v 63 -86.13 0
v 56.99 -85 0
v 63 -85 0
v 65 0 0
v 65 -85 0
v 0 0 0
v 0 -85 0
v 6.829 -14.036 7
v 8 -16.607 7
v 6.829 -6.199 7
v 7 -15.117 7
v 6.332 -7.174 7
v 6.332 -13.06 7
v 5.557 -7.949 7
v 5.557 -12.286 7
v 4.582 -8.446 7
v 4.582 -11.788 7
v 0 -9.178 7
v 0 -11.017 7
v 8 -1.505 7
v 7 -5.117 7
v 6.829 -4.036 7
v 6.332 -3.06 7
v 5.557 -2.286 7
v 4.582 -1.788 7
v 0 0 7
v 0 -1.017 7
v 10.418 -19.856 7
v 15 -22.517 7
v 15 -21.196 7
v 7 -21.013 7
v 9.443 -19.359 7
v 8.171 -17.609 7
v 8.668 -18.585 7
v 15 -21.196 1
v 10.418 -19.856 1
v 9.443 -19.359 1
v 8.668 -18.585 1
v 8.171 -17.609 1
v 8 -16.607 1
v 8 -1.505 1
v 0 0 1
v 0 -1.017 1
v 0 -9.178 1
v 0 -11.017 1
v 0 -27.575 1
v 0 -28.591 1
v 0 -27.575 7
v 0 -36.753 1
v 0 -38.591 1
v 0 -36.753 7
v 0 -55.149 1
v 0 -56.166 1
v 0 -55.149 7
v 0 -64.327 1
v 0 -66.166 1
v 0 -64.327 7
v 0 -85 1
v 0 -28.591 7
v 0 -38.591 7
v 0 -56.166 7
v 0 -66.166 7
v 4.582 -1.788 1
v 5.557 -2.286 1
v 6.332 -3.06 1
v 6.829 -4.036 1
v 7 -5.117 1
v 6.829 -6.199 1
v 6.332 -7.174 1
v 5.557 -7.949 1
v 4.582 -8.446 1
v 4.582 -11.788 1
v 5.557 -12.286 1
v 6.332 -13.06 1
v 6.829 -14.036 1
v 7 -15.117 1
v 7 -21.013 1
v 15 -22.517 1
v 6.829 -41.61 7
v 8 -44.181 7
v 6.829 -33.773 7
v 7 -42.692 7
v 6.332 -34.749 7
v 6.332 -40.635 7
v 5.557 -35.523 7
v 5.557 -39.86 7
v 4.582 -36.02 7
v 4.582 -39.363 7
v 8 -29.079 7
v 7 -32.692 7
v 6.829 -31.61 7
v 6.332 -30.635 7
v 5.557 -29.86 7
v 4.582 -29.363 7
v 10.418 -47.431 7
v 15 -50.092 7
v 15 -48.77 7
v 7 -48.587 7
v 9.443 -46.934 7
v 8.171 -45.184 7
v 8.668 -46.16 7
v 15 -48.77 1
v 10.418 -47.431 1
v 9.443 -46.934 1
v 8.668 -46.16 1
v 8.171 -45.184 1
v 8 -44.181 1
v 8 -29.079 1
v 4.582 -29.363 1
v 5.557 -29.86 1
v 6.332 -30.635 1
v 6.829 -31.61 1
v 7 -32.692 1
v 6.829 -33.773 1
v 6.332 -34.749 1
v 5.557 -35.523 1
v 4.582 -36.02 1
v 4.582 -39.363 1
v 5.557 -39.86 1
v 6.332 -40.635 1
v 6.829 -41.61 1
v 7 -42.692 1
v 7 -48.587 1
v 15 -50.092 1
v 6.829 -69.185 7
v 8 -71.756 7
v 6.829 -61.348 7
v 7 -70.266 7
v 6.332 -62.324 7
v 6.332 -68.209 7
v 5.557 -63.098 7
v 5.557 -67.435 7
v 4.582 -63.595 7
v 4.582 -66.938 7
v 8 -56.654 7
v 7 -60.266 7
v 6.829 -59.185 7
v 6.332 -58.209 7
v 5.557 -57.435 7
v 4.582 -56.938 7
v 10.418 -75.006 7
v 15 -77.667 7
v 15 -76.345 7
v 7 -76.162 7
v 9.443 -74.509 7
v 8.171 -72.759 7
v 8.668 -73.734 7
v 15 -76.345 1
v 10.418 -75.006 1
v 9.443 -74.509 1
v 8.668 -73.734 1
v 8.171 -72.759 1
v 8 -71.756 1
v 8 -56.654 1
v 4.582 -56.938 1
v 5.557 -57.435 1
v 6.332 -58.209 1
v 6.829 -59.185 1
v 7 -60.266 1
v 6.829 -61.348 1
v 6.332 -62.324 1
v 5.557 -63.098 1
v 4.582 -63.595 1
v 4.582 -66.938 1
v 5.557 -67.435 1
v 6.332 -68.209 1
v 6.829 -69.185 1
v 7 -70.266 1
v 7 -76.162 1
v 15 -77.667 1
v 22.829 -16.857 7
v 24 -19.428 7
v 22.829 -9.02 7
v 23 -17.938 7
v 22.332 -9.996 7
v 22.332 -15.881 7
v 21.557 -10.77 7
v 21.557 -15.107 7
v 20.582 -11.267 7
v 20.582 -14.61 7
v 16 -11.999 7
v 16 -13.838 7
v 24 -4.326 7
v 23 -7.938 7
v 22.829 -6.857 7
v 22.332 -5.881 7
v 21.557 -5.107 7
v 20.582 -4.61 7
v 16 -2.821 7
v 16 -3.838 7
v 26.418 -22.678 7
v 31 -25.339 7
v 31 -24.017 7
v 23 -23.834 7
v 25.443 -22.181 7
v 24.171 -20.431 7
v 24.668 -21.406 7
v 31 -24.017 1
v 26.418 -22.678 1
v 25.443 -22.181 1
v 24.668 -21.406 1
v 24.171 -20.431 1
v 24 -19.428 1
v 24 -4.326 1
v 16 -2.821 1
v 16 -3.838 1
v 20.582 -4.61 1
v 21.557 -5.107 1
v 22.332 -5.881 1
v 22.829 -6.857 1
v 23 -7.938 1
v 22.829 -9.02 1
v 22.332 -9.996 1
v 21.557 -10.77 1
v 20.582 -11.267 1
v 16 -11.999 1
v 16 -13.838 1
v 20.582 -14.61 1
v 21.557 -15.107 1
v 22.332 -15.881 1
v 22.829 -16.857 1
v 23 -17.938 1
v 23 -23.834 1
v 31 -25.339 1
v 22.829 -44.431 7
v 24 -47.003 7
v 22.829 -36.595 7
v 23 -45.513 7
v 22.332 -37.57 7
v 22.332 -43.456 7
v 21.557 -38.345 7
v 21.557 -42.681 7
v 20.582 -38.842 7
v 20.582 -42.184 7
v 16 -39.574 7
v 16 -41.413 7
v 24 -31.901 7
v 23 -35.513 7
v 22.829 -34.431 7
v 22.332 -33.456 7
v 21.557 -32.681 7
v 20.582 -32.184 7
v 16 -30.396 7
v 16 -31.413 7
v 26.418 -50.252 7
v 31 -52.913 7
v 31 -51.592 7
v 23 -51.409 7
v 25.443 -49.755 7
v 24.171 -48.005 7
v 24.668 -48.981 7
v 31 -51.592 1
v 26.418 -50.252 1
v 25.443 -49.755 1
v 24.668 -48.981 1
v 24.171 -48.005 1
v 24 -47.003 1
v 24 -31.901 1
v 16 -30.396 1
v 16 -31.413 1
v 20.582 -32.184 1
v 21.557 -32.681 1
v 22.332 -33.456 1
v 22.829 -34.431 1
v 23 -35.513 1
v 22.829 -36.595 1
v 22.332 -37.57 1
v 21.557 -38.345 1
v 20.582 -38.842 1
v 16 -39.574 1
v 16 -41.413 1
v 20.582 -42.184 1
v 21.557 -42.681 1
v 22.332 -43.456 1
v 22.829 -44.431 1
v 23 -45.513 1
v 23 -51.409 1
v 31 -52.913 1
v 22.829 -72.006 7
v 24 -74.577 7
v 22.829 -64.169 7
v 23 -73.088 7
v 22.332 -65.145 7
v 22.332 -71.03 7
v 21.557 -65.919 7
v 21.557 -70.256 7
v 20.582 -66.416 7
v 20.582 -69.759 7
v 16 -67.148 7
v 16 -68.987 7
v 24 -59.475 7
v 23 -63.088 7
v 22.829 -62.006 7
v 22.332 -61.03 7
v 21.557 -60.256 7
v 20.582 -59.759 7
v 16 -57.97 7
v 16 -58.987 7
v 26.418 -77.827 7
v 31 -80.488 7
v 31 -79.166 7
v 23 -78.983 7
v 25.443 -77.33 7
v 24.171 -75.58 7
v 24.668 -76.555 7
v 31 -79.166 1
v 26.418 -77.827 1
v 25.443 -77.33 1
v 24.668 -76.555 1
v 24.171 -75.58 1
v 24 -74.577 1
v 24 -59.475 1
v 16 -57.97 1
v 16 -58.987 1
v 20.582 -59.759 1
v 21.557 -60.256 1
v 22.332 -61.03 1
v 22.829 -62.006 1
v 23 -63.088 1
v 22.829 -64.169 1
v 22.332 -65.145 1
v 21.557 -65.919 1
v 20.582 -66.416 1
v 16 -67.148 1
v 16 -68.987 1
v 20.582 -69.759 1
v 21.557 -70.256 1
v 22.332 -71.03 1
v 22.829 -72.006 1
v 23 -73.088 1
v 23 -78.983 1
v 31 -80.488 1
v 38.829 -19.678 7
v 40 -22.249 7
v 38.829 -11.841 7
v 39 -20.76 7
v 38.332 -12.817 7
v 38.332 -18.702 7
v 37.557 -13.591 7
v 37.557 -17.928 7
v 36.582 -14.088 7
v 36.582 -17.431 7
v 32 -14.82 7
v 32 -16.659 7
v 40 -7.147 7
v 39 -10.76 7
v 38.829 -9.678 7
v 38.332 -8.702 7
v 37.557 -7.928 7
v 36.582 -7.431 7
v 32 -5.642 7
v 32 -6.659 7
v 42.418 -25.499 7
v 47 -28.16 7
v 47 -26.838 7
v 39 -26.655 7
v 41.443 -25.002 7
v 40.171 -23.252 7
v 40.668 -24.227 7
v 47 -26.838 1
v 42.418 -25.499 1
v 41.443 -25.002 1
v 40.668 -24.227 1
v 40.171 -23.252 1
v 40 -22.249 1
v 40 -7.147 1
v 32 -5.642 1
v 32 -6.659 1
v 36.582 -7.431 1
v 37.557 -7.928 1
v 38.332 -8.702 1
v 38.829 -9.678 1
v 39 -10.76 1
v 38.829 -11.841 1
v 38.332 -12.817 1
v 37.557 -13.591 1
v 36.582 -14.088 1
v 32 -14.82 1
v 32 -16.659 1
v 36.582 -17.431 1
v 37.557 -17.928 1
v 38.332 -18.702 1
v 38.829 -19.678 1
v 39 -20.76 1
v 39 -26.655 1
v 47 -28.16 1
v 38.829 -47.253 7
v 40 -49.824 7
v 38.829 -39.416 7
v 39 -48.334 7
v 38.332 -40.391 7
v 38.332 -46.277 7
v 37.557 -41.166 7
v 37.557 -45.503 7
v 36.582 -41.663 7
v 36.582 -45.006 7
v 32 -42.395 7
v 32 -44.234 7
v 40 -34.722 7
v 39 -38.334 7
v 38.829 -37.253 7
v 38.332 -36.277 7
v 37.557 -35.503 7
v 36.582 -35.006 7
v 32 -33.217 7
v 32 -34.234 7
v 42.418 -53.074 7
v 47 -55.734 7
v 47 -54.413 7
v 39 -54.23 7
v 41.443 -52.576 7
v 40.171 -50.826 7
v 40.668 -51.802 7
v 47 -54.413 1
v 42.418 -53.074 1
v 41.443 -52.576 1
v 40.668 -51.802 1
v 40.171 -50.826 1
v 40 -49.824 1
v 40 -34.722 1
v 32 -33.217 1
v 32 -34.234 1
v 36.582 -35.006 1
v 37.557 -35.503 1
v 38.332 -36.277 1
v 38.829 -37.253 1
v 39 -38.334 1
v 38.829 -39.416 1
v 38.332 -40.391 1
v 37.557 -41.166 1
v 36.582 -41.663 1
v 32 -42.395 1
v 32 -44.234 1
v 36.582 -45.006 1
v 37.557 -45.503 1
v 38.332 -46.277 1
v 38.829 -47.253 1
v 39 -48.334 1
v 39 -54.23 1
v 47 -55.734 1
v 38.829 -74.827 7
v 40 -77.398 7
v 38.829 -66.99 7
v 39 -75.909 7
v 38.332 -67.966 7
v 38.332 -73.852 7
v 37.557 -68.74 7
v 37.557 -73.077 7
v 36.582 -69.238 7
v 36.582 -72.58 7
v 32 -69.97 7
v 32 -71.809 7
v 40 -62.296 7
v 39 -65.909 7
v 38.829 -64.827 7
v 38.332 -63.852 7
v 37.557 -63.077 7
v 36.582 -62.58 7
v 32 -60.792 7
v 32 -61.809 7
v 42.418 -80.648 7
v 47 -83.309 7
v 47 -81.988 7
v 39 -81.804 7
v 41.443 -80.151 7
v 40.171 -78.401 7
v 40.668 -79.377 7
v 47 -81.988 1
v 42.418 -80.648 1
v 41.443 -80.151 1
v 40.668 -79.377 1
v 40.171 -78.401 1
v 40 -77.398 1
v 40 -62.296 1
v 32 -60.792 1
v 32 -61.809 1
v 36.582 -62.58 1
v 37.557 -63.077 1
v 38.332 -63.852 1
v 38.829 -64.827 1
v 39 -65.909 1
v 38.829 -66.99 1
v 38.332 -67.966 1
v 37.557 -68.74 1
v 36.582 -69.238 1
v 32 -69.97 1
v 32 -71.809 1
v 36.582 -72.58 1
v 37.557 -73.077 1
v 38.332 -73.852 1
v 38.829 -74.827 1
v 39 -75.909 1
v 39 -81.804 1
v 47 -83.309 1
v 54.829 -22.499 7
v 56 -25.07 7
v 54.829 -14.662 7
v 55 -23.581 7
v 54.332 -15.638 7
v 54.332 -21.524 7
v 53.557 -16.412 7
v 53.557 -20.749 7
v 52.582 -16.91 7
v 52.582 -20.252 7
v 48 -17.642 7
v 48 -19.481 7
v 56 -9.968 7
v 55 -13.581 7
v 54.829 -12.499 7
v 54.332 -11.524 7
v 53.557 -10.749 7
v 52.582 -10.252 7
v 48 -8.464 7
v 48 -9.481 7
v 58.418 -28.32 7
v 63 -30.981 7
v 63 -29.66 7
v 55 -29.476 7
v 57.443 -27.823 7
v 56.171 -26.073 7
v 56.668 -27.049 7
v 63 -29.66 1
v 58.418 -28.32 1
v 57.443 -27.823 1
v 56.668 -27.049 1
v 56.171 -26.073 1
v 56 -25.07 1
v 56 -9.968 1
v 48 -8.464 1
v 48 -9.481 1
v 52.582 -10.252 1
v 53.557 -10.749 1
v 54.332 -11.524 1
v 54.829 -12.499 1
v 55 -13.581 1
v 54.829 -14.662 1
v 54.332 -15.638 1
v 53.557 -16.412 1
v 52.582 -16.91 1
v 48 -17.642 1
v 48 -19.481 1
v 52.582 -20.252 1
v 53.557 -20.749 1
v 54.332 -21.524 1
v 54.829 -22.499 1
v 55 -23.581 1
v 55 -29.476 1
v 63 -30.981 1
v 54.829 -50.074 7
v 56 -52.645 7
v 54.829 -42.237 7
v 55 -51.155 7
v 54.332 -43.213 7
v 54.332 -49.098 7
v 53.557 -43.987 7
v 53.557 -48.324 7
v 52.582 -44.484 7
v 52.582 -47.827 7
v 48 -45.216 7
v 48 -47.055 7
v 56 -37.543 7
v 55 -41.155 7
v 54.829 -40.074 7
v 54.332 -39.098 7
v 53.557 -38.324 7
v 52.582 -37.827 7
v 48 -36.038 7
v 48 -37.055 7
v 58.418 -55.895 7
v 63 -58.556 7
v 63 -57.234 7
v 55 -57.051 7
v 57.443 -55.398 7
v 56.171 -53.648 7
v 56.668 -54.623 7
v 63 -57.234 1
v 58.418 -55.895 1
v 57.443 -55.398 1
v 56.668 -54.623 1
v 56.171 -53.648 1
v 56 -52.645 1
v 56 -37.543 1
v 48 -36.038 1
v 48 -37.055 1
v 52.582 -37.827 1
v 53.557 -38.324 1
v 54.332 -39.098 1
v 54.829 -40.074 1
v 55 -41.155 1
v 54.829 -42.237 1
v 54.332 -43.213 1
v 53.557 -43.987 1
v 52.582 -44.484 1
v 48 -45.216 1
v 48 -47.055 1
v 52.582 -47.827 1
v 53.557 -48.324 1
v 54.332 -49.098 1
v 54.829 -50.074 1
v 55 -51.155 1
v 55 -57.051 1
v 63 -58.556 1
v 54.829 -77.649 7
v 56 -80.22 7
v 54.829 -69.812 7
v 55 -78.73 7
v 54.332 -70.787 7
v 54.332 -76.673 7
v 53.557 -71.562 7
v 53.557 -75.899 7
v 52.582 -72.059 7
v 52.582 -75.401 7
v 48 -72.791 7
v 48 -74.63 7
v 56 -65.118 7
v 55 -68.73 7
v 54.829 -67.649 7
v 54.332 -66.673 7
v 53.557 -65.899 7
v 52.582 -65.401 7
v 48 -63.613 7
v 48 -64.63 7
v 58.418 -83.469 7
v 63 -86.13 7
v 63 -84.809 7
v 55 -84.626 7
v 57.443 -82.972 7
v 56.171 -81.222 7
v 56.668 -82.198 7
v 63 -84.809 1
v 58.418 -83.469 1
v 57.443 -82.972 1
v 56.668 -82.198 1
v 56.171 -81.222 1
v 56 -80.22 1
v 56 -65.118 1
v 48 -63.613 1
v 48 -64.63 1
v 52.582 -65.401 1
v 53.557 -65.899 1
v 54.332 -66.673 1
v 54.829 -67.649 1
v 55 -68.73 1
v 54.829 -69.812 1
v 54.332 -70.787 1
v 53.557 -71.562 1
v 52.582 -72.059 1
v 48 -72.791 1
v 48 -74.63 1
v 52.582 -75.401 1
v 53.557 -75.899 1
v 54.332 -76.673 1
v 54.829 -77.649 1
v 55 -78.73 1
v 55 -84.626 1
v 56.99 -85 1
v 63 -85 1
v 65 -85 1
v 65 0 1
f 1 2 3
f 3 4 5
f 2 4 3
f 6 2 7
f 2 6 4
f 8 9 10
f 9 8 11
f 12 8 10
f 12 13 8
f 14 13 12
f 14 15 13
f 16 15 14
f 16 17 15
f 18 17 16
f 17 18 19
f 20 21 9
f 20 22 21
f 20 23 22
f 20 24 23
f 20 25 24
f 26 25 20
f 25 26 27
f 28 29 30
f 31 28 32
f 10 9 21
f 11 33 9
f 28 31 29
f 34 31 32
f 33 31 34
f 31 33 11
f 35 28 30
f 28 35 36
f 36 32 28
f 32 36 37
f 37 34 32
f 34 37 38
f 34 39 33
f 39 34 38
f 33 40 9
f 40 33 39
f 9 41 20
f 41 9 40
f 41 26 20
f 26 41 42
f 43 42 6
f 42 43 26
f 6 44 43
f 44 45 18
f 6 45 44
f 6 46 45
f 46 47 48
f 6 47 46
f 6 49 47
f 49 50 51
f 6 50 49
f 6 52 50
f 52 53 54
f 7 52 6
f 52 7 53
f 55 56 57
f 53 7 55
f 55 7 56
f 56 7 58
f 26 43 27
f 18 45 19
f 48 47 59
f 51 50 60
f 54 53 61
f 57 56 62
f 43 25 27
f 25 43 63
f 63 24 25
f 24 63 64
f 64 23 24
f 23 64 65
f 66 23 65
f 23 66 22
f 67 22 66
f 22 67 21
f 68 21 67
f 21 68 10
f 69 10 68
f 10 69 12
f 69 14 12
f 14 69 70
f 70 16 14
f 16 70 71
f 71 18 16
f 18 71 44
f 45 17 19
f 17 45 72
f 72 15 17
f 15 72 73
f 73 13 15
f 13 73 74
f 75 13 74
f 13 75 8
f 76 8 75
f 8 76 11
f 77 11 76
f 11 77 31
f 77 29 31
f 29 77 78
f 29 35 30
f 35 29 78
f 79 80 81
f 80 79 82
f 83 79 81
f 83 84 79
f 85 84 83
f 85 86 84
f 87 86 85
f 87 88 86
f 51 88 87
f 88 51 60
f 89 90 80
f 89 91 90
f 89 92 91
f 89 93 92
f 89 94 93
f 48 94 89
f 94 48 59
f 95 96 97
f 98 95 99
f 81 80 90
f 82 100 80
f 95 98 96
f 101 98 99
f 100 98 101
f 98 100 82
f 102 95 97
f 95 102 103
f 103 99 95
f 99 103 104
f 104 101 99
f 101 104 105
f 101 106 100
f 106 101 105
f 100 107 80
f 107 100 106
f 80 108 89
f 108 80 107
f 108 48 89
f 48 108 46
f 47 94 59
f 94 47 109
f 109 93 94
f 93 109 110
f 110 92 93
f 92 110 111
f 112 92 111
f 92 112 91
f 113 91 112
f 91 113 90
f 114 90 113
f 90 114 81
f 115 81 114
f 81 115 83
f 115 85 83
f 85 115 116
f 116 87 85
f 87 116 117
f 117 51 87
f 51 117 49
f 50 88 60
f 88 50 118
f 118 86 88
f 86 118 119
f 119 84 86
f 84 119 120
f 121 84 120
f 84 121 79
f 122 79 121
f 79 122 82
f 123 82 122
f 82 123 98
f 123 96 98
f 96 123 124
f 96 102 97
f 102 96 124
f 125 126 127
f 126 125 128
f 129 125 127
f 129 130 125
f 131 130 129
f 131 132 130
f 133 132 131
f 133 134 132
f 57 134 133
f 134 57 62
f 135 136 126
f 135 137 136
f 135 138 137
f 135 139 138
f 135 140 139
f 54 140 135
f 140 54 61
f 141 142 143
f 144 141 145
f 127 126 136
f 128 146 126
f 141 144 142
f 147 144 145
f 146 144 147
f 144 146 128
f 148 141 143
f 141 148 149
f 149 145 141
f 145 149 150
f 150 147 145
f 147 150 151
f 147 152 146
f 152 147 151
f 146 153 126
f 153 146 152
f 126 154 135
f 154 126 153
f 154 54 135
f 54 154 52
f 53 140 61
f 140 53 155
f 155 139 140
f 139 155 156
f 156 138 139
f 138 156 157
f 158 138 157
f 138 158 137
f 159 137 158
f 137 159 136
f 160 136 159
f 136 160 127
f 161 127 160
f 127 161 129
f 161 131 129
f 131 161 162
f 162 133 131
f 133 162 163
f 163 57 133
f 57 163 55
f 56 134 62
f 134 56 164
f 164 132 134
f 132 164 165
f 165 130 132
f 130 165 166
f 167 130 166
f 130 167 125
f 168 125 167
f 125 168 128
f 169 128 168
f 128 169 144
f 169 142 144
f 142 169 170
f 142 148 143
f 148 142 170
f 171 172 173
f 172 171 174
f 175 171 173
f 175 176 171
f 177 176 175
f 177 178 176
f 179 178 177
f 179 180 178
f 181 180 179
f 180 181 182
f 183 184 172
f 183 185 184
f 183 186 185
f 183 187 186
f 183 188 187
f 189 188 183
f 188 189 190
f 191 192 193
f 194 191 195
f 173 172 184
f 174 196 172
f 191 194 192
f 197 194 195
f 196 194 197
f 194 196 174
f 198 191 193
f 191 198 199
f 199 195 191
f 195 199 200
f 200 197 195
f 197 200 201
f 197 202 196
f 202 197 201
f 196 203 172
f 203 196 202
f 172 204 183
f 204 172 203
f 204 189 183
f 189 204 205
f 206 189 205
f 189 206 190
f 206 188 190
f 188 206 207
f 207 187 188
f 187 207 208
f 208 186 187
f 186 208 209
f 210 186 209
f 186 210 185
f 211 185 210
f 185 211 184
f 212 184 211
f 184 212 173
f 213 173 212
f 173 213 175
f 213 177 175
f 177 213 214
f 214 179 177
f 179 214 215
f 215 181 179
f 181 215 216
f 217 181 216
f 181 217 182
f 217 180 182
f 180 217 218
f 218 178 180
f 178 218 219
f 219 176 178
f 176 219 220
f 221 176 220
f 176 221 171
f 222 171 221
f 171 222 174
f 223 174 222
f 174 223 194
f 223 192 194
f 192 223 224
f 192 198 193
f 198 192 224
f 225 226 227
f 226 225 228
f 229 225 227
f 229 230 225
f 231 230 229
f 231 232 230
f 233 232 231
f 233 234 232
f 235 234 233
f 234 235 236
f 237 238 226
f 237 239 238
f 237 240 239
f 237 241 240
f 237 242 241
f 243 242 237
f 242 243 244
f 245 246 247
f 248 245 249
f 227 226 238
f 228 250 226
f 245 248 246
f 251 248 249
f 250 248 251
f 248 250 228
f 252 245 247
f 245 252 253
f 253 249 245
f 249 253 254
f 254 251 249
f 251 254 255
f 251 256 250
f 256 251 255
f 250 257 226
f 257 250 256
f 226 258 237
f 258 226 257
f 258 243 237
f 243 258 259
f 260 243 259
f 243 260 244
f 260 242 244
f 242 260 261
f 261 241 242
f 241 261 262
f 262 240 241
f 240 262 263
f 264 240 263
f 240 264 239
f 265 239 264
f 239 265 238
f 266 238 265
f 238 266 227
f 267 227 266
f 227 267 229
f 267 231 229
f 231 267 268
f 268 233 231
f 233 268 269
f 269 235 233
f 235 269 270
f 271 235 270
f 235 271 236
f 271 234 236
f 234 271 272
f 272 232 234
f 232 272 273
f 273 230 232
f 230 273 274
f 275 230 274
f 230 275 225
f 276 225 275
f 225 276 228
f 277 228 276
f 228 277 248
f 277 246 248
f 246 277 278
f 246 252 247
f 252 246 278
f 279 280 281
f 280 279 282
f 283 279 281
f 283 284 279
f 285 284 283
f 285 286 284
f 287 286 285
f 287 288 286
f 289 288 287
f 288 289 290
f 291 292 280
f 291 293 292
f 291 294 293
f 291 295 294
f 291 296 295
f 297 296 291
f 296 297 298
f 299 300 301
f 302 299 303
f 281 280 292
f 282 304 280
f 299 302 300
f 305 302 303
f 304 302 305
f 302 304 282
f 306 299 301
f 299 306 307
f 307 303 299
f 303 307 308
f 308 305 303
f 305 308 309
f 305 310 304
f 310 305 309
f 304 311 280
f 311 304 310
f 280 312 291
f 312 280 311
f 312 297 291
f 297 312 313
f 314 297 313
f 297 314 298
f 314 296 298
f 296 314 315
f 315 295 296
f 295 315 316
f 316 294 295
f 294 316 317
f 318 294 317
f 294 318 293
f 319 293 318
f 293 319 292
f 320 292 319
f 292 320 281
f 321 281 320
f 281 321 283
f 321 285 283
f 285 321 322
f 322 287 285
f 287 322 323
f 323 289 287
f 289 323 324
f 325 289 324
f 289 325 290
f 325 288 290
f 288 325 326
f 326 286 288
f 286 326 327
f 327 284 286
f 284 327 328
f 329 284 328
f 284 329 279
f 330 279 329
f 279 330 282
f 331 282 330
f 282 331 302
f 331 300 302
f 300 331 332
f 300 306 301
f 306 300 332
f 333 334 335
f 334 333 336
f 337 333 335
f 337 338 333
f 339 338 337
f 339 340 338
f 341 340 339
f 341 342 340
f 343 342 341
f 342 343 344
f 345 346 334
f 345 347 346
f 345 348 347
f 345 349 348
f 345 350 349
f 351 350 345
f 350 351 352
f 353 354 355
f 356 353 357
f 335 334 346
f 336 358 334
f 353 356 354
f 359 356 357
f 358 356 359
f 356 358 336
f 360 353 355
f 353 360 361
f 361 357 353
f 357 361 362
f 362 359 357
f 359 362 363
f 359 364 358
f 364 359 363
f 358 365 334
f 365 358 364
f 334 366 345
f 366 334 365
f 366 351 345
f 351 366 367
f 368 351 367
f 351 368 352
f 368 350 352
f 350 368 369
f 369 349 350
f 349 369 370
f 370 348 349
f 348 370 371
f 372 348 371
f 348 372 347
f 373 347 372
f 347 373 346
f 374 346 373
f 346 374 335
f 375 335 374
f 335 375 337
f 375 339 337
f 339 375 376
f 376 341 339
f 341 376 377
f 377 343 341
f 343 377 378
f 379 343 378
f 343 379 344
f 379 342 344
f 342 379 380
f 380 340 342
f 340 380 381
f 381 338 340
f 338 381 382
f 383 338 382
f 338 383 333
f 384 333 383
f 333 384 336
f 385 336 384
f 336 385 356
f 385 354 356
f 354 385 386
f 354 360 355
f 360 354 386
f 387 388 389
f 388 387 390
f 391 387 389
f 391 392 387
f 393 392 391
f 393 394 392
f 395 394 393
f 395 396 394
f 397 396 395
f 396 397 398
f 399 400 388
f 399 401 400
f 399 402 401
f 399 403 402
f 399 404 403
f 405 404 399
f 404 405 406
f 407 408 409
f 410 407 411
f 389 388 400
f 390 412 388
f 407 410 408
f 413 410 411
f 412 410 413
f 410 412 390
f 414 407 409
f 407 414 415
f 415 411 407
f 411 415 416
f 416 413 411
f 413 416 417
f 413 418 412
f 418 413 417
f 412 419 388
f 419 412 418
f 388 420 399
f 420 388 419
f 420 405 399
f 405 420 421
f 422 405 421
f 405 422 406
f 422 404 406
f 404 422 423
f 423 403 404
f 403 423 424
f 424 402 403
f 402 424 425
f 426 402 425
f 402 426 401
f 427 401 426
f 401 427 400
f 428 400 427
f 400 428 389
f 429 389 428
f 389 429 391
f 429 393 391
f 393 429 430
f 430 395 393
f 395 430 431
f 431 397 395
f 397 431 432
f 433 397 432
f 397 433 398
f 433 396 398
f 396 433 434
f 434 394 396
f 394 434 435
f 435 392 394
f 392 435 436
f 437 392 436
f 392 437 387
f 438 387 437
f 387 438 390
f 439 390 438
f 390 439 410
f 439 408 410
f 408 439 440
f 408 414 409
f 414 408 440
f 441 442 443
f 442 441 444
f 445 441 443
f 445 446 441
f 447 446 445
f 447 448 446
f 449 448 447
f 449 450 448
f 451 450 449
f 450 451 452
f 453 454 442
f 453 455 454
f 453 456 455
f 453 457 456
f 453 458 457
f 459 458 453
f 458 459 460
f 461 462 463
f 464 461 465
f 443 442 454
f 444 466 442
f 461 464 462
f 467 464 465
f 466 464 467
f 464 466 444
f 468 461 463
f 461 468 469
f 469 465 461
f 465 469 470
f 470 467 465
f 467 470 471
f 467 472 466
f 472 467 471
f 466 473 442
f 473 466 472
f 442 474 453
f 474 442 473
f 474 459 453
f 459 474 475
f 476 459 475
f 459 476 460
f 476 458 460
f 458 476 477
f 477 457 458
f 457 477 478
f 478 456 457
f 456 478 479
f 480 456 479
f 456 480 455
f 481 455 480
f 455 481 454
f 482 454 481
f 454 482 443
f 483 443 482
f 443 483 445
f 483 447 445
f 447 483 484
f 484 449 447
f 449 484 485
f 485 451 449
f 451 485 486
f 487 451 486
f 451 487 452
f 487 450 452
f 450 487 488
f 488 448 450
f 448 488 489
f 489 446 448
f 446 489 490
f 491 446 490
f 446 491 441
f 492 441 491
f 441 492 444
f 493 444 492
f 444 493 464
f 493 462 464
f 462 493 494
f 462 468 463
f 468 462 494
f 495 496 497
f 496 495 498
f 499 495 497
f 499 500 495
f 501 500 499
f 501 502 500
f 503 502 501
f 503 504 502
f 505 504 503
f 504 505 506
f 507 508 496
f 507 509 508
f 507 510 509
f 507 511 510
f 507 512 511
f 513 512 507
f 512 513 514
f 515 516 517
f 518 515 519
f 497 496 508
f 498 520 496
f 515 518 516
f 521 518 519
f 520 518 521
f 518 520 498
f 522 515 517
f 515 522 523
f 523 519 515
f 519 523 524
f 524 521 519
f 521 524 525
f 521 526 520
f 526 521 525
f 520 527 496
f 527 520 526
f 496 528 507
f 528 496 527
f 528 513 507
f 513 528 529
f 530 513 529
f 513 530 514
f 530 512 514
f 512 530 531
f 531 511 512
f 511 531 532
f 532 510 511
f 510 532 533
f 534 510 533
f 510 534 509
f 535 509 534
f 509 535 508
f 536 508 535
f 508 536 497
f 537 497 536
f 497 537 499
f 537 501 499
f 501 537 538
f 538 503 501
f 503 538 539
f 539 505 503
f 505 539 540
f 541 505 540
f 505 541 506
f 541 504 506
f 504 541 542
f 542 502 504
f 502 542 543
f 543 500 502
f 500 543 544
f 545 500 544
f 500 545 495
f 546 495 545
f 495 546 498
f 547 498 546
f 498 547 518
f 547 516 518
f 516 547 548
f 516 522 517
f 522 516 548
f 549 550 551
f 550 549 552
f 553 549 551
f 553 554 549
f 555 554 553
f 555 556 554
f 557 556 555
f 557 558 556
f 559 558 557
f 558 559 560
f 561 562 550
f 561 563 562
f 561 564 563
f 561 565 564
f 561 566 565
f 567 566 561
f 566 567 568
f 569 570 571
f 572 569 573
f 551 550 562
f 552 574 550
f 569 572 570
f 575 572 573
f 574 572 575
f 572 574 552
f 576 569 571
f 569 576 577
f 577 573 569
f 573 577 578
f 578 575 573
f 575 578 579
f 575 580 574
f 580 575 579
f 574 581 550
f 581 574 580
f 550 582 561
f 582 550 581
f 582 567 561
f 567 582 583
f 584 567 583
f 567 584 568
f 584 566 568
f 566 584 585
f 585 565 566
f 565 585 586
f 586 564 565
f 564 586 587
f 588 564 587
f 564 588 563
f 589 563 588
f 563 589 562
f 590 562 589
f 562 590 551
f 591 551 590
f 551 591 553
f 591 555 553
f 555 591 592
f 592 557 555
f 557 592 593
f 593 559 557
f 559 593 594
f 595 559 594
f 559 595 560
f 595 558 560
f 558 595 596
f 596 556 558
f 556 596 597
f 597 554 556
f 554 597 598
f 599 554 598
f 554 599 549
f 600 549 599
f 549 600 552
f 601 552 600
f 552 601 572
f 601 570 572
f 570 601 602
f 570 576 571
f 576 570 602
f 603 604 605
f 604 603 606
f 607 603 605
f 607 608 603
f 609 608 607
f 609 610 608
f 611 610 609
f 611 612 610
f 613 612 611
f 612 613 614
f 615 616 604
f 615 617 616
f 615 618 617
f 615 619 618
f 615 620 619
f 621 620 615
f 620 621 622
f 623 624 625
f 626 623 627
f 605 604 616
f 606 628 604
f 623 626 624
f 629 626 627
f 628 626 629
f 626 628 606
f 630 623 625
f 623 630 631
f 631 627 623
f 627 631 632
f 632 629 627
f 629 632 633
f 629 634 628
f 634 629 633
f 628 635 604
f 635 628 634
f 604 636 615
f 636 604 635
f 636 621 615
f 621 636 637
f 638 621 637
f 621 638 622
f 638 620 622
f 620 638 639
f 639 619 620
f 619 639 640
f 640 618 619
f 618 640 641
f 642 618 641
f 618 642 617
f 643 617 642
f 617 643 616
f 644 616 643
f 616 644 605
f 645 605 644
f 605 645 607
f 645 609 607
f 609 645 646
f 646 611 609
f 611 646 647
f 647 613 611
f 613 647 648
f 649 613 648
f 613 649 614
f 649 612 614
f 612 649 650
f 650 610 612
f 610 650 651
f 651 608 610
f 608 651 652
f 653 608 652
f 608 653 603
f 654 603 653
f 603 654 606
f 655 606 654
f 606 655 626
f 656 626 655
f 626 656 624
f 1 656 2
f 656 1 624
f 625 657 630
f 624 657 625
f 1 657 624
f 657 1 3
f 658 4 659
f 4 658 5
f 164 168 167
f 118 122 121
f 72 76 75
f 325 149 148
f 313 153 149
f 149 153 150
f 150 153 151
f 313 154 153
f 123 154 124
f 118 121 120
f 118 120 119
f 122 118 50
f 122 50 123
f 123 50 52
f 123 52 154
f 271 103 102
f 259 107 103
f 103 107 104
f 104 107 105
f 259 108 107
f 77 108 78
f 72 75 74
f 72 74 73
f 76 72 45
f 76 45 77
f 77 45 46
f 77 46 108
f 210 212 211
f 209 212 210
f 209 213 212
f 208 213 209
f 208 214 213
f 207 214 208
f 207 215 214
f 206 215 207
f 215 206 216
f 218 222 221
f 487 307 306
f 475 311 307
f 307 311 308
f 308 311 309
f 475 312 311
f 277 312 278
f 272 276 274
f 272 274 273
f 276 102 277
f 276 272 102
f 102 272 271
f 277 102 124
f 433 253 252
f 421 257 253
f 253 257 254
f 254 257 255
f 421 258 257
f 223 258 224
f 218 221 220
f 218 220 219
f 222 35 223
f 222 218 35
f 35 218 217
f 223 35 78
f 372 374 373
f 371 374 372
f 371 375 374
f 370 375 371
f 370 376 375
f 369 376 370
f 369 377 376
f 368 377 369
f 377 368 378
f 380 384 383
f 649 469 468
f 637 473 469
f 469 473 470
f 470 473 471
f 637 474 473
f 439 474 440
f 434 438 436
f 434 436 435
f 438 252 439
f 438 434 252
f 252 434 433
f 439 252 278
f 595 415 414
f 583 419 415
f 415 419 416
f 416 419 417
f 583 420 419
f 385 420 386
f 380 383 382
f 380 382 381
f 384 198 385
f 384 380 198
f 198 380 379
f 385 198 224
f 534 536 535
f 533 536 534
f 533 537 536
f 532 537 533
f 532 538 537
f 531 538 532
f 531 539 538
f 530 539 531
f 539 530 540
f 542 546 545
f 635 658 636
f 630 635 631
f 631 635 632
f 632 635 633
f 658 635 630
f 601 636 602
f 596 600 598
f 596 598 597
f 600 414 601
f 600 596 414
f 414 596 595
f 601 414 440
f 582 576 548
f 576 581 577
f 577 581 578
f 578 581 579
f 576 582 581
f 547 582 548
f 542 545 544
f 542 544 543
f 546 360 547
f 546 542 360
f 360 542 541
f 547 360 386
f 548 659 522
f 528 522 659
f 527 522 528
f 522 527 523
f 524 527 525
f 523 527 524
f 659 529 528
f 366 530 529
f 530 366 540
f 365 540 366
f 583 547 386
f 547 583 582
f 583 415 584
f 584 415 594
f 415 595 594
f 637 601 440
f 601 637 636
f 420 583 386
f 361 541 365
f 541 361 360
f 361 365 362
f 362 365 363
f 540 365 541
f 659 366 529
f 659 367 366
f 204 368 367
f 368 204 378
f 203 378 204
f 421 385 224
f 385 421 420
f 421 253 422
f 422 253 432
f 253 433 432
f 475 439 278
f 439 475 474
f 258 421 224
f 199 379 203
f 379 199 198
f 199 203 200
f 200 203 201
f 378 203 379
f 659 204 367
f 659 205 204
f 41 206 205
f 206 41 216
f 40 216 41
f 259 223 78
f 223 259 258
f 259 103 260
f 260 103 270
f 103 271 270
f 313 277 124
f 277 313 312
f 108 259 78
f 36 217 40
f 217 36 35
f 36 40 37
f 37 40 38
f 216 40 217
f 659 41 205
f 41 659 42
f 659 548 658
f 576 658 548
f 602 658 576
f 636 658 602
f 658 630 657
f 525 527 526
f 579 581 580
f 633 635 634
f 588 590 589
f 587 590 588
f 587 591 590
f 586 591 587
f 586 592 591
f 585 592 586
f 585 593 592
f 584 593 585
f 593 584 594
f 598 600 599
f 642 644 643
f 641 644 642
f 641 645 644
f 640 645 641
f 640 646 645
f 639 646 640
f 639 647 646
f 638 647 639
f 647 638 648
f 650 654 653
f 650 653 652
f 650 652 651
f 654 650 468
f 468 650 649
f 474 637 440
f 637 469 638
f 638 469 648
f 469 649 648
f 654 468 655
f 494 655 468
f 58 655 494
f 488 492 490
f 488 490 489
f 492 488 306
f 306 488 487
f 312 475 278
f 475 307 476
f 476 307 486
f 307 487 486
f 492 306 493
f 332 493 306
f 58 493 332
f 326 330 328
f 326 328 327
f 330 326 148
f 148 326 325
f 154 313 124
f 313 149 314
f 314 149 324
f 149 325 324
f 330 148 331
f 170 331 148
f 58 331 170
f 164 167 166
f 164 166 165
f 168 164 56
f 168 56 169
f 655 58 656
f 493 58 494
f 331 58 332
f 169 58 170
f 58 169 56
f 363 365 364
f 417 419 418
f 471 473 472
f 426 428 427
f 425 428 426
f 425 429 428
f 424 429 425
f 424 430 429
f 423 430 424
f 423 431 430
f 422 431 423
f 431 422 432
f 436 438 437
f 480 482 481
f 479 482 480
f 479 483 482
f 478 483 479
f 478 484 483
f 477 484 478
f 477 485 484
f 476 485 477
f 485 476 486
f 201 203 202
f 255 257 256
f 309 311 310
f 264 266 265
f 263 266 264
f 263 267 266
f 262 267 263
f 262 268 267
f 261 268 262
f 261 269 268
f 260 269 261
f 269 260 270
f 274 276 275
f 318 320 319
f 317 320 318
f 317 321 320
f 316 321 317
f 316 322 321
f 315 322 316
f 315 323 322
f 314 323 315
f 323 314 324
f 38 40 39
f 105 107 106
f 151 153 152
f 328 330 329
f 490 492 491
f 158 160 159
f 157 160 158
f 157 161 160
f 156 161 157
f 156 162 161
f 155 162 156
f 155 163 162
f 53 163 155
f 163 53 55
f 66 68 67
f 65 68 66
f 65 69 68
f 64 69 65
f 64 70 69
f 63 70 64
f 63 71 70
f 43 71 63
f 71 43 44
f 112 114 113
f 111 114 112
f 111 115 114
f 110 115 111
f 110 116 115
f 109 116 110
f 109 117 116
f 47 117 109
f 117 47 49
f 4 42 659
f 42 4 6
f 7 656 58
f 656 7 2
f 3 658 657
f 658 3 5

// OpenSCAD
// file: memory.scad
include <globs.scad>;

$fn = 20;

/** delta_y is how much a cell moves down for each cell across we move. */
delta_y  = memory_cell_pitch_x * tan(memory_slope);


/*

       |
       |
       |
       |
       |
       |
       |

*/

/** Memory block - the shape which holds and releases a ball bearing. This is designed for a 6mm ball bearing - it will have to be redesigned if not. */
module memory_block()
{
  block_height = memory_cell_pitch_y - 8*cos(memory_slope);
  block_width = memory_cell_pitch_x - 1;
  difference() {
    // Outline/bounding box of the block
    polygon(points = [[0,0], [block_width, -delta_y],
		      [block_width, -delta_y-block_height], [0, -block_height]]);
    // Upper left chamber cut-out
    hull() {
      polygon(points = [[-0.1,-1], [1, -1.1*tan(memory_slope)-1],
			[1, 1.1*tan(memory_slope)-9],
			[-0.1, -1.1*tan(memory_slope)-9]]);
      translate([3.5,-3.5*tan(memory_slope)-4.5]) circle(d=7);
    }

    // Lower left chamber cut-out

    hull() {
      polygon(points = [[-0.1,-11], [1, -1.1*tan(memory_slope)-11],
			[1, -1.1*tan(memory_slope)-20],
			[-0.1, -1.1*tan(memory_slope)-20]]);
      polygon(points = [[-0.1,-20], [7, -7.1*tan(memory_slope)-20],
			[7, -7.1*tan(memory_slope)-22],
			[-0.1, -7.1*tan(memory_slope)-22]]);
      translate([3.5,-3.5*tan(memory_slope)-11-3.5]) circle(d=7);
    }

    // Right chamber cut out
    hull() {
      polygon(points = [[8,0],[memory_cell_pitch_x+0.1,0],[memory_cell_pitch_x+0.1,-block_height+1-delta_y],[8,-block_height+3.5-8*tan(memory_slope)+1]]);
      translate([11.5,-11.5*tan(memory_slope)-11-3.5]) circle(d=7);
    }
  } // end of difference
}

module horizontal_stop_bar()
{
  polygon(points = [[0,0],[7, -7*tan(memory_slope)],
		    [7, -7*tan(memory_slope)-1],[0,-1]]);
}

module vertical_stop_bar()
{
  polygon(points = [[0,0],[1, -1*tan(memory_slope)],
		    [1, -1*tan(memory_slope)-5.5],[0,-5.5]]);
}


/* ----------------- TEST SECTION ------------------------ */

/* Test objects */
for(x = [0:3]) {
  for(y = [0:3]) {
    translate([memory_cell_pitch_x * x,
	       -delta_y * x - memory_cell_pitch_y*y]) linear_extrude(height=6) memory_block();
  }
}
//  translate([5,-100,5]) cube([memory_cell_pitch_x - 1, 100,2]);

for(y = [0:3]) {
  translate([0,-8*0.5*(1+cos($t*360)) - y*memory_cell_pitch_y]) {
    color([1.0,0,0]) translate([8.5, -8.5*tan(memory_slope)]) linear_extrude(height=8) horizontal_stop_bar();
    color([0,1.0,0]) translate([15.5, -15.5*tan(memory_slope)-14]) linear_extrude(height=8) vertical_stop_bar();
  }
 }

/* Test balls */
translate([12,-25.5,3]) sphere(d=6);
// file: globs.scad
/* Global definitions for millihertz 5 */

/* All dimensions are in millimetres */
memory_slope = 10; // Degrees

/** Memory cell pitch - the horizontal and vertical distances between one row and the next. Memory is arranged so one column (y) make up one word. Words are laid out vertically. */
memory_cell_pitch_x = 16;
memory_cell_pitch_y = 28 * cos(memory_slope);

/* Number of bits used in the data. This must be 32. */
bits = 32;

/** Accumulator / subtractor unit. Pitch is the horizontal spacing between both input and output. */
accumulator_input_pitch = 22;

/** Frame */

frame_internal_width = 900;
frame_internal_height = 2200;

/** Frame will probably be 50mm angle iron */
frame_width = 50;
// main file
/* A 3d printed small test of the memory cell unit */
include <globs.scad>;
use <memory.scad>;

/** delta_y is how much a cell moves down for each cell across we move. */
delta_y  = memory_cell_pitch_x * tan(memory_slope);


translate([0,-85,0]) cube([65,85,1]);

for(x = [0:3]) {
  for(y = [0:2]) {
    translate([memory_cell_pitch_x * x,
	       -delta_y * x - memory_cell_pitch_y*y]) linear_extrude(height=7) memory_block();
  }
}
